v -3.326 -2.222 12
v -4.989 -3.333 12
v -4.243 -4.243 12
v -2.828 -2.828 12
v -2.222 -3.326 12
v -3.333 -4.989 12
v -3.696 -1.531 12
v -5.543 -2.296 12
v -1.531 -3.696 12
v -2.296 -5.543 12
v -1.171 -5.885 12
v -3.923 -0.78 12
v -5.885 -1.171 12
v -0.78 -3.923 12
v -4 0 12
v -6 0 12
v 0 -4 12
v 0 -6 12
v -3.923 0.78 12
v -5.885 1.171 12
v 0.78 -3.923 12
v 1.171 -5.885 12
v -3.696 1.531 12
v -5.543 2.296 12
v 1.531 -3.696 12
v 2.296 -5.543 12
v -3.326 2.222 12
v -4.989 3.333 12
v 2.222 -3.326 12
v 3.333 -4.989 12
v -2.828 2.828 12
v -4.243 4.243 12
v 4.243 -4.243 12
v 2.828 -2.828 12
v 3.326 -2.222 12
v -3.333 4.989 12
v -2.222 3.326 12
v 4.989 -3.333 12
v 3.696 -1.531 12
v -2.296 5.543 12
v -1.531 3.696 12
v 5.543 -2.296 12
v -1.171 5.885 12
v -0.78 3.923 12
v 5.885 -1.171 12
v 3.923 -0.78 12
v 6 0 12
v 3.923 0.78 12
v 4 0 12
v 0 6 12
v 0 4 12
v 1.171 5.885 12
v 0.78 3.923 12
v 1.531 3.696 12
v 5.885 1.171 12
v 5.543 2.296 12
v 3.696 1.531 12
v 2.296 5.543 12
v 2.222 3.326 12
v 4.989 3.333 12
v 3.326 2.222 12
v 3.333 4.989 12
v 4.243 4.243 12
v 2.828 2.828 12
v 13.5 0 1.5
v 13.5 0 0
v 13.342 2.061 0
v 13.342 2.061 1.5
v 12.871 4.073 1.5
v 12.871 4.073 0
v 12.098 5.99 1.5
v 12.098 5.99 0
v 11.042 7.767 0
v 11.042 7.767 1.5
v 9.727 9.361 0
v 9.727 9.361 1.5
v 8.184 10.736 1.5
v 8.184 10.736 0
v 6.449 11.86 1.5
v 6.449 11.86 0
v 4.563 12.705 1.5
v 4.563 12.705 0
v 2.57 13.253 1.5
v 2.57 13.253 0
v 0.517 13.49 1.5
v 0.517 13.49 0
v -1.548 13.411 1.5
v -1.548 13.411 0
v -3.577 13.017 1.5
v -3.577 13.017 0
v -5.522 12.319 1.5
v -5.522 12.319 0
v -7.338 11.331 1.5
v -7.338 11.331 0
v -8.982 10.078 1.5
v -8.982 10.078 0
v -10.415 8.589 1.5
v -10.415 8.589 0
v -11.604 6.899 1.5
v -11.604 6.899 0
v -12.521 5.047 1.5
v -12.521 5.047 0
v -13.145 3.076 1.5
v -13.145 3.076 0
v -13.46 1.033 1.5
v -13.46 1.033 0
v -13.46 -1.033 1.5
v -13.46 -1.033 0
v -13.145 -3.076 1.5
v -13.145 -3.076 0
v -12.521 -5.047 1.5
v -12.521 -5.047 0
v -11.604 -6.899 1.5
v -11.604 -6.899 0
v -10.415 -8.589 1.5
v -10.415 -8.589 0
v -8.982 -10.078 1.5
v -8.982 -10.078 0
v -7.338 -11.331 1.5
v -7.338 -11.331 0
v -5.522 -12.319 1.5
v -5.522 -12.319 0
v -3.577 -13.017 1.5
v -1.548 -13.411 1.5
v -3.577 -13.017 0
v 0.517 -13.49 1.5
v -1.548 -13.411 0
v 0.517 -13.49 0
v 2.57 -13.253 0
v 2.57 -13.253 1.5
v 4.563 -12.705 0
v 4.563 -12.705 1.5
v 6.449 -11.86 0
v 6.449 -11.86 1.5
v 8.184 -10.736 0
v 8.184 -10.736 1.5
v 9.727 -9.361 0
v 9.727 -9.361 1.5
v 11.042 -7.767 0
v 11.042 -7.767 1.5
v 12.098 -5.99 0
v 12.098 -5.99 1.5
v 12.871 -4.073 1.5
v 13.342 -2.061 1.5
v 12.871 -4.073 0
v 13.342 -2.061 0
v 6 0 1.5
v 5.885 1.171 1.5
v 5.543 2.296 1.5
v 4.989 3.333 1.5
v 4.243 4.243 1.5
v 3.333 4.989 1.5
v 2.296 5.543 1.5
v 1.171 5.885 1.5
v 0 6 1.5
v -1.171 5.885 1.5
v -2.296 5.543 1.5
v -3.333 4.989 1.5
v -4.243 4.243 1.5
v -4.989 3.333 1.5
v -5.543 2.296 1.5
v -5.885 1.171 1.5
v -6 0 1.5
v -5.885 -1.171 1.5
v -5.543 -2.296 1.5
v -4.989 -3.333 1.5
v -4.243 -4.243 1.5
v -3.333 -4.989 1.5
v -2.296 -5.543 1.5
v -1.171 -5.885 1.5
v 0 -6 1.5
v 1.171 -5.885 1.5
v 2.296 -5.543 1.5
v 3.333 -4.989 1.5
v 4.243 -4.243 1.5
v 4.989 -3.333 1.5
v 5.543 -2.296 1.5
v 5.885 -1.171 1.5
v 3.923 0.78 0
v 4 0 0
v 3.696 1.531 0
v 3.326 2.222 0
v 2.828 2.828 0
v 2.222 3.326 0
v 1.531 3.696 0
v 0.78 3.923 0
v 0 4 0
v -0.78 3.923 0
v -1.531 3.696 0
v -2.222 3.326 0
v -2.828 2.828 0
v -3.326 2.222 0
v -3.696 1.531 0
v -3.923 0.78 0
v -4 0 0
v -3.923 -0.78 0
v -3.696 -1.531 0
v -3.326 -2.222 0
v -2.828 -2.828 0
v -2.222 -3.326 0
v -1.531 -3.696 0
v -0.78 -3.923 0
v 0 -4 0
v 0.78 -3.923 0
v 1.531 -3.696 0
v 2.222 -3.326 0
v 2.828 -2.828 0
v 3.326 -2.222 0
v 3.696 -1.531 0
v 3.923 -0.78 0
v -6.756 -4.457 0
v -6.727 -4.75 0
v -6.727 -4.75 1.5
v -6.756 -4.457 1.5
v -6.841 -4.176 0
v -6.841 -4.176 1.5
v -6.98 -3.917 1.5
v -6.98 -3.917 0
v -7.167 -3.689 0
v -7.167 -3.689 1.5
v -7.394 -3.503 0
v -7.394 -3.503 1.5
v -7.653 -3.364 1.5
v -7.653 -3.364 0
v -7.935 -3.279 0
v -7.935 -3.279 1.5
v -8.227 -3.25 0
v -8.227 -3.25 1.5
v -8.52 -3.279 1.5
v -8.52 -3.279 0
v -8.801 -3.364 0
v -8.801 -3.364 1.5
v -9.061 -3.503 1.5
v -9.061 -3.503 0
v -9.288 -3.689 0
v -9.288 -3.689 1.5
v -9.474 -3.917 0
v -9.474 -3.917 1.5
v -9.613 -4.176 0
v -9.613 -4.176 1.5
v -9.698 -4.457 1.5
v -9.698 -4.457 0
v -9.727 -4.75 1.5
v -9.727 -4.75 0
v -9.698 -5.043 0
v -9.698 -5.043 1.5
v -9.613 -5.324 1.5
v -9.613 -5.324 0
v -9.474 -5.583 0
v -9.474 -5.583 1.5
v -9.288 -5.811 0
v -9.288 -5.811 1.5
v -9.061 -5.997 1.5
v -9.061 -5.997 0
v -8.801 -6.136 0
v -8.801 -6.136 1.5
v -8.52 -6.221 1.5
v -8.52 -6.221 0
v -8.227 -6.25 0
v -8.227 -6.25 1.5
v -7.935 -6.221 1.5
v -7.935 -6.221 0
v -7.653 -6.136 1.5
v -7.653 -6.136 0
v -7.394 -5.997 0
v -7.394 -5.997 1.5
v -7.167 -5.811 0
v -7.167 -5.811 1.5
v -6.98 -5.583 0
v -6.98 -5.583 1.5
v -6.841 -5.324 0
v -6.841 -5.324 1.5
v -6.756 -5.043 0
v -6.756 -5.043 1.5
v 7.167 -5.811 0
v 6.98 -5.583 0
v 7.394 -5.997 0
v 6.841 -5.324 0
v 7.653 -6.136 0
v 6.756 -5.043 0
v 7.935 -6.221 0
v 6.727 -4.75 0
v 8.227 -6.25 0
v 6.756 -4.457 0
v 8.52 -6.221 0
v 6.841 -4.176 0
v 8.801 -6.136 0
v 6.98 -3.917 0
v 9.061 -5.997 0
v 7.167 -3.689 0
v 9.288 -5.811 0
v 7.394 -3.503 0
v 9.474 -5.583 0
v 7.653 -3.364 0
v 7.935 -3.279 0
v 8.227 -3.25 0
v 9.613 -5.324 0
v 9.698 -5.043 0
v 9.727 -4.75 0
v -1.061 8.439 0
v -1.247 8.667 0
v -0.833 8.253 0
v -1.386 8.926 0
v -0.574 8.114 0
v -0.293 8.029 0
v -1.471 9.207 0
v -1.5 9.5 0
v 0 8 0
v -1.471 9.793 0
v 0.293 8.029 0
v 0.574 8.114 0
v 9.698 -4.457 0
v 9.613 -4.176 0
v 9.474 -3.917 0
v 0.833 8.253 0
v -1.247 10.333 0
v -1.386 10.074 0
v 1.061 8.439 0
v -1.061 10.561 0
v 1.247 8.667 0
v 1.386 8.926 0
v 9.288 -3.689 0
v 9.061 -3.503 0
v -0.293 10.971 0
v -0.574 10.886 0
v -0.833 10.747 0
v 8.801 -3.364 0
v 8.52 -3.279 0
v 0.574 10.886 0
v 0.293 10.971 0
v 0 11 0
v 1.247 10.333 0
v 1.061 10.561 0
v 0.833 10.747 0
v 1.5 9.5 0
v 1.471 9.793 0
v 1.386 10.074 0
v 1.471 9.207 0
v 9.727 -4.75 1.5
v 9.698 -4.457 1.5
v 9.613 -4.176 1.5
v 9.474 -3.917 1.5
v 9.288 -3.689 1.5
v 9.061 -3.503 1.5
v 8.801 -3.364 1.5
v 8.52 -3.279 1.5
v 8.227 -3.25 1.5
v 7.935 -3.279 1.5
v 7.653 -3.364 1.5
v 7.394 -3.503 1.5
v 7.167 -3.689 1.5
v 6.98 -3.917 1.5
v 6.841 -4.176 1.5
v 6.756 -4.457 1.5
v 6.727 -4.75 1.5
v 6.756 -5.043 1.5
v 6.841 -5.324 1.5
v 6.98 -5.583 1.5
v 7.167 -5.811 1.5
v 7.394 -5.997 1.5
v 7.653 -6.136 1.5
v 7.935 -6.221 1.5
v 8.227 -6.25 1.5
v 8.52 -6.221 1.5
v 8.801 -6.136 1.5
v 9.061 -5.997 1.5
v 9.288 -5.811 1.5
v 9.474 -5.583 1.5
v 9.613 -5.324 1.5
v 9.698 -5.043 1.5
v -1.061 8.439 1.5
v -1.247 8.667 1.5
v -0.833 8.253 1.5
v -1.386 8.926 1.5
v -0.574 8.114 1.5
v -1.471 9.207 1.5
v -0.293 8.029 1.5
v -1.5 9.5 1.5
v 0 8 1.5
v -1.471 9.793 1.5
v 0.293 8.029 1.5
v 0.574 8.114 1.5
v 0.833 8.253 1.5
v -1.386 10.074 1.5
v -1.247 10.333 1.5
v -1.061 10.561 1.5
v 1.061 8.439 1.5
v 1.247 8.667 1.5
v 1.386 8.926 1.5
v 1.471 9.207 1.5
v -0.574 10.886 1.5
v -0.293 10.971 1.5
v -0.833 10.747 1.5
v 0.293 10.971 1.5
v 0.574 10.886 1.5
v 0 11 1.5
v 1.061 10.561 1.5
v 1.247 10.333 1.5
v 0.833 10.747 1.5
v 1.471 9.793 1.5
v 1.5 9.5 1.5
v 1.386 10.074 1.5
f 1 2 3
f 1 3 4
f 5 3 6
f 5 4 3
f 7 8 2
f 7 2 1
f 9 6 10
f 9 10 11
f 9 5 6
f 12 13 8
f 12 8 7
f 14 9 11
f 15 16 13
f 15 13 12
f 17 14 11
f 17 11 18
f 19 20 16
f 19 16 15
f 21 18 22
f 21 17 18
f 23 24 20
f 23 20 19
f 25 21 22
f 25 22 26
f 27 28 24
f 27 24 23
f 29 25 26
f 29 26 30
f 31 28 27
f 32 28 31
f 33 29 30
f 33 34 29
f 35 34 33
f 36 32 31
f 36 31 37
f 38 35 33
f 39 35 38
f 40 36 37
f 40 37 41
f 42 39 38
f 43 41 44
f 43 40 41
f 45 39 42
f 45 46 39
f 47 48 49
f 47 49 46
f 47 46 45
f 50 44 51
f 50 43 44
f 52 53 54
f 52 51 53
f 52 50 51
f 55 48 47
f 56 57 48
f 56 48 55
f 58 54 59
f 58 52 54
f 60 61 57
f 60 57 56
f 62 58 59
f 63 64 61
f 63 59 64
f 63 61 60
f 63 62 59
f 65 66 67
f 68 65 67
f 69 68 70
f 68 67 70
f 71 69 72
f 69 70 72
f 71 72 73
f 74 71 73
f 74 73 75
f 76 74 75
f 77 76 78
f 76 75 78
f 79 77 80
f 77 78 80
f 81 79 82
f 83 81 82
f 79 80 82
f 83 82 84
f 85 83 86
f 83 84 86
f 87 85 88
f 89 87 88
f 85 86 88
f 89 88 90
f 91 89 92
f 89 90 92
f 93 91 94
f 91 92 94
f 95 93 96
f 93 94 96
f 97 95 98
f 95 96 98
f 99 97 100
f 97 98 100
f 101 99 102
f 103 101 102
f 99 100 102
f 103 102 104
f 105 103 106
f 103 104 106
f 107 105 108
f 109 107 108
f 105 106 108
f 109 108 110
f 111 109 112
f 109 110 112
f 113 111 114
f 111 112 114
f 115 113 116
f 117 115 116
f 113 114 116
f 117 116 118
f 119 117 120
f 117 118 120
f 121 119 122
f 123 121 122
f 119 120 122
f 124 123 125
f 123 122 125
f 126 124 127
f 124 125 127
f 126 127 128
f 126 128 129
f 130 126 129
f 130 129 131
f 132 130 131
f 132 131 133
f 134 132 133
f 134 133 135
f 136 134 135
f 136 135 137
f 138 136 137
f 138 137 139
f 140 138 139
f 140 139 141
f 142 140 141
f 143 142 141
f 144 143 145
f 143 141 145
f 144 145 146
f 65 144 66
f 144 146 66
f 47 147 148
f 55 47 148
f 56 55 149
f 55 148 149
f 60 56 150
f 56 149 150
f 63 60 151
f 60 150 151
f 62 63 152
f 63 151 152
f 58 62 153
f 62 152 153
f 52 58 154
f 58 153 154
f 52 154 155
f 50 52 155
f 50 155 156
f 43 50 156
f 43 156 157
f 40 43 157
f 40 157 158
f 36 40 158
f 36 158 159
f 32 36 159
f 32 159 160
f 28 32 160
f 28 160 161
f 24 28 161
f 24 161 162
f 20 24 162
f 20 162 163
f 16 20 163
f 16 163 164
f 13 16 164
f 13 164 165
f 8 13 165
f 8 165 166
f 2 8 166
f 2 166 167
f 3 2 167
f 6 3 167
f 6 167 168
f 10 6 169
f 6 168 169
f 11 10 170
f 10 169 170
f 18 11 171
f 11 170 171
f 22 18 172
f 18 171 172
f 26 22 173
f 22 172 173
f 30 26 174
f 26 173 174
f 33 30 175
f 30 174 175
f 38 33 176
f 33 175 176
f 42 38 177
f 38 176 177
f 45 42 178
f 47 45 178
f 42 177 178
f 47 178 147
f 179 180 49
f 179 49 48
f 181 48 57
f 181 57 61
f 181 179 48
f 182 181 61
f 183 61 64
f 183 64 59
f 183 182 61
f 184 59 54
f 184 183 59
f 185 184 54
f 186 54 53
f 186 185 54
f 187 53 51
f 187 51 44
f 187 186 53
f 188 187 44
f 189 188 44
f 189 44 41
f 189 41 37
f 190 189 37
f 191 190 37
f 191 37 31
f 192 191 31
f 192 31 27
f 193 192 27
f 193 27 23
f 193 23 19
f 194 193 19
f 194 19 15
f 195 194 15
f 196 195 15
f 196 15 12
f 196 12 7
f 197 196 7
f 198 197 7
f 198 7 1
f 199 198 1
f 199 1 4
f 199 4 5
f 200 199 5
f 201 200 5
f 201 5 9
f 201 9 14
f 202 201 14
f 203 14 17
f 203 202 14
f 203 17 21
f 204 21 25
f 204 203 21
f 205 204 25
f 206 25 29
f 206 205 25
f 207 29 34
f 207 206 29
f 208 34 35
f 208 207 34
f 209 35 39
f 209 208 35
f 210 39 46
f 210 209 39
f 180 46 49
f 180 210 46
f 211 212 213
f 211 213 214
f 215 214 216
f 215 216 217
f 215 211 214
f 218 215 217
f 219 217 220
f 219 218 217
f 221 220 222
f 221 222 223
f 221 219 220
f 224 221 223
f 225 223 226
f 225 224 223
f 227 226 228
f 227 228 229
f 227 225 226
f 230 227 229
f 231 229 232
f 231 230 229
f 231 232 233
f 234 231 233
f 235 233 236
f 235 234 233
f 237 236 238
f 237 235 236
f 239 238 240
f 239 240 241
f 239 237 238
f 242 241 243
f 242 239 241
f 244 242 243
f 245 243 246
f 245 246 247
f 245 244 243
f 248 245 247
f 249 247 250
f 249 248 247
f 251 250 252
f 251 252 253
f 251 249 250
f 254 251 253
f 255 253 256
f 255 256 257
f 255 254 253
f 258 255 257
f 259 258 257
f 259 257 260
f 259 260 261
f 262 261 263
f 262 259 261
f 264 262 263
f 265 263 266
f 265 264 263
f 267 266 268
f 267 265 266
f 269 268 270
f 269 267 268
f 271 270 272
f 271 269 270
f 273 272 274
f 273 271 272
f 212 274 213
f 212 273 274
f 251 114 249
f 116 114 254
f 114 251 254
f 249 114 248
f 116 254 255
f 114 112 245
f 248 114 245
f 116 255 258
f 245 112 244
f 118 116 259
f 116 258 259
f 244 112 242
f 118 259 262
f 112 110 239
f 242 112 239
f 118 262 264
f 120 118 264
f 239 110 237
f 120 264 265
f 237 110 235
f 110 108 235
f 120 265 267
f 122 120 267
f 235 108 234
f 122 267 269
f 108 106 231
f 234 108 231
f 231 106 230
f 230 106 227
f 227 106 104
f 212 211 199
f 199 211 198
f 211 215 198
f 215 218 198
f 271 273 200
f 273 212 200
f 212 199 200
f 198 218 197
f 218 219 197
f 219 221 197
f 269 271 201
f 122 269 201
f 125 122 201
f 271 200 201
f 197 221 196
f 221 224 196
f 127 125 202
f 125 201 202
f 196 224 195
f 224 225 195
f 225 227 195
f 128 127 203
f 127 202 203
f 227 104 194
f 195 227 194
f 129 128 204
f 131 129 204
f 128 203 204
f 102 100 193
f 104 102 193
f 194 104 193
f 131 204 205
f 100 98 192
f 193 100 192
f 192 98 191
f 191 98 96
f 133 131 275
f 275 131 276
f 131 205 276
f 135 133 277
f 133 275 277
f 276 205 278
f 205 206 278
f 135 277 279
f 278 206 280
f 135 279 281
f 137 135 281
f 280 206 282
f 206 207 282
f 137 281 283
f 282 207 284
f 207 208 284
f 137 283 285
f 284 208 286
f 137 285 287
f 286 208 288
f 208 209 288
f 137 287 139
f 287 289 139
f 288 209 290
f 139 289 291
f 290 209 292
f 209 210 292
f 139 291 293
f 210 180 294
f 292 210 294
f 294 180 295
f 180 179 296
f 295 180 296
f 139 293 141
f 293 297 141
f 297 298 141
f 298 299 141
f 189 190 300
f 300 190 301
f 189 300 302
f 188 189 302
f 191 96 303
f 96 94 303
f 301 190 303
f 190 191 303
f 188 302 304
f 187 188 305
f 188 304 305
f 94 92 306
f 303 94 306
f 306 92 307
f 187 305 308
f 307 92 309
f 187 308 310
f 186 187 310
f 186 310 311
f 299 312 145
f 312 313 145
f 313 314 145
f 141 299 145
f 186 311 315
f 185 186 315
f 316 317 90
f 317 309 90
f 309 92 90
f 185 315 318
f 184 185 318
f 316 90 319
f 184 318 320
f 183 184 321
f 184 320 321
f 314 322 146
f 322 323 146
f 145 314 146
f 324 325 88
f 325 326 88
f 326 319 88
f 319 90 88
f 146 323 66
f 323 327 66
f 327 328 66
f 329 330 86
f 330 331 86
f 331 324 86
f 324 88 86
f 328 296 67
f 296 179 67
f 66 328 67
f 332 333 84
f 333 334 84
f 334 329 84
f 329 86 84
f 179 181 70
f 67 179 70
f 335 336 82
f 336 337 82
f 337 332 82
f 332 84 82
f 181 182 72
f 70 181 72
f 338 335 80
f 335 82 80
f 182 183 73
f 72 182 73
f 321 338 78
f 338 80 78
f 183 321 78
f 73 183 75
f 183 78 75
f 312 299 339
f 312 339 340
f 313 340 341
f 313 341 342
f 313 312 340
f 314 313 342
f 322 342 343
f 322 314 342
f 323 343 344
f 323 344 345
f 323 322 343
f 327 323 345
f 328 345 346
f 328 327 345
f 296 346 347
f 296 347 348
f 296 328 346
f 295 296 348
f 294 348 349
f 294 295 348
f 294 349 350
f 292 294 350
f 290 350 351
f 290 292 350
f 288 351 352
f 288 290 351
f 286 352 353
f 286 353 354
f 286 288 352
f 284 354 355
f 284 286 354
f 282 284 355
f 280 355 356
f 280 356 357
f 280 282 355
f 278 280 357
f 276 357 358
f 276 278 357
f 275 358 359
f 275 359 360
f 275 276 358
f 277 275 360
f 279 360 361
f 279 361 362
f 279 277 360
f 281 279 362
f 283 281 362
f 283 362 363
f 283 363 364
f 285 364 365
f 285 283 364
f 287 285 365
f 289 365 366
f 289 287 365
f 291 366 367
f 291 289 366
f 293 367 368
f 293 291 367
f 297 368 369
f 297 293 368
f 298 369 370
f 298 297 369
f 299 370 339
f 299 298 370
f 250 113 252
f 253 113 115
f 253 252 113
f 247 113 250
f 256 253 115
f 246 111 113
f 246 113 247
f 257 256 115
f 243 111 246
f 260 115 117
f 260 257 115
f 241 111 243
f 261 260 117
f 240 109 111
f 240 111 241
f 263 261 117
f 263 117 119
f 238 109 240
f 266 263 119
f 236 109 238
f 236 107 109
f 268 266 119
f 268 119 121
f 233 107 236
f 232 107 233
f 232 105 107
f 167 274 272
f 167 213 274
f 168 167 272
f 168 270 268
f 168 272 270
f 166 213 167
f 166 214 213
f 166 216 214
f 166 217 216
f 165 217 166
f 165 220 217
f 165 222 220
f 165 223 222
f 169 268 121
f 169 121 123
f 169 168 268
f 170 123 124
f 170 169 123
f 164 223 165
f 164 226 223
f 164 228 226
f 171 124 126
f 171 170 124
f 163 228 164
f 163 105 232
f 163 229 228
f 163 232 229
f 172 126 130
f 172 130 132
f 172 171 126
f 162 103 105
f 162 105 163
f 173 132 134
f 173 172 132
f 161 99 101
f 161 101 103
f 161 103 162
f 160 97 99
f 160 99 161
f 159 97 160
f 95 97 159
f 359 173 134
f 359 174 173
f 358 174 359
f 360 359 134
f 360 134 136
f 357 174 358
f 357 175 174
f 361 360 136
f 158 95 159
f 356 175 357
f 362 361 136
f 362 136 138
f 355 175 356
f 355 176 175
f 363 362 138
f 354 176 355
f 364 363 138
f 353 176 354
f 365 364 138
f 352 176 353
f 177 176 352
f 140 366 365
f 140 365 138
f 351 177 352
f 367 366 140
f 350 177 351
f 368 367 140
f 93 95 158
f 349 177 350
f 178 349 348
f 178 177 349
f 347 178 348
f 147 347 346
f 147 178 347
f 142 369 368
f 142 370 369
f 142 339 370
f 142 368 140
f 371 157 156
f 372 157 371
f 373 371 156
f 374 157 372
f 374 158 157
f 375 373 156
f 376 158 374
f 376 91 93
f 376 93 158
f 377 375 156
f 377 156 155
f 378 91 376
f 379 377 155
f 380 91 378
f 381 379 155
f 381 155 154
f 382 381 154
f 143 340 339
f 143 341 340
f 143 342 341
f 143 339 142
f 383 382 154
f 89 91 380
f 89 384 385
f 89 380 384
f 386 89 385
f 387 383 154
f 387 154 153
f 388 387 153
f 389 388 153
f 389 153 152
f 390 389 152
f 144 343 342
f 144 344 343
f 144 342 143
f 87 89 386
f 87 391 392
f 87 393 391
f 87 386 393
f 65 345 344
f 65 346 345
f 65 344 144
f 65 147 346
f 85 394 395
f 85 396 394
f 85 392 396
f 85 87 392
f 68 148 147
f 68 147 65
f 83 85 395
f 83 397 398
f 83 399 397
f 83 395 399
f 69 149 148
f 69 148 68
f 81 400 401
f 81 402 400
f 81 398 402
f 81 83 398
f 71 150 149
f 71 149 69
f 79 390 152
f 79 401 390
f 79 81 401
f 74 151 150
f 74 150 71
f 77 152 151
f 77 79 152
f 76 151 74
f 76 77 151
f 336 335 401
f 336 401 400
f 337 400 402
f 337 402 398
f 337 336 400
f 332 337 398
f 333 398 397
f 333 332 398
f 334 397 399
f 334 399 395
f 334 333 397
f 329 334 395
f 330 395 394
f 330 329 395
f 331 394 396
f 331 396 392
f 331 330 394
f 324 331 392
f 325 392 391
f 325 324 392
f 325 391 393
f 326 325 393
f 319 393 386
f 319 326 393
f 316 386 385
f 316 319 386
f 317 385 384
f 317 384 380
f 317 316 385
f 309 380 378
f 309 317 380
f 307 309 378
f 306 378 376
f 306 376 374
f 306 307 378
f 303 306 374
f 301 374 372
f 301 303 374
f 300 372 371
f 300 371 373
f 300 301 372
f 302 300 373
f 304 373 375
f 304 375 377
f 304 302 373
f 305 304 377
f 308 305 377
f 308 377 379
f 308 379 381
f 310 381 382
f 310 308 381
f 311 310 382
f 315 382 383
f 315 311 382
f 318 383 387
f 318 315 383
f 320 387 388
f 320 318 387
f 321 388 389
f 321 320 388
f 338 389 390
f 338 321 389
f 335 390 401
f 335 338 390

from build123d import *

# Parameters (mm, degrees)
SKETCH_1_R      = 13.5
SKETCH_1_R_2    = 1.5
SKETCH_1_R_3    = 4
EXTRUDE_1_DEPTH = 1.5
SKETCH_1_4_R    = 6
SKETCH_1_4_R_2  = 4
EXTRUDE_2_DEPTH = 12


with BuildPart() as part:
    # 草图1 → 凸台-拉伸1 (new body)
    with BuildSketch(Plane.XY):
        Circle(SKETCH_1_R)
        with Locations((-8.227241336, -4.75)):
            Circle(SKETCH_1_R_2, mode=Mode.SUBTRACT)
        with Locations((8.227241336, -4.75)):
            Circle(SKETCH_1_R_2, mode=Mode.SUBTRACT)
        with Locations((0, 9.5)):
            Circle(SKETCH_1_R_2, mode=Mode.SUBTRACT)
        Circle(SKETCH_1_R_3, mode=Mode.SUBTRACT)
    extrude(amount=EXTRUDE_1_DEPTH)

    # 草图1<4> → 凸台-拉伸2 (add)
    with BuildSketch(Plane.XY):
        Circle(SKETCH_1_4_R)
        Circle(SKETCH_1_4_R_2, mode=Mode.SUBTRACT)
    extrude(amount=EXTRUDE_2_DEPTH)


solid = part.part
